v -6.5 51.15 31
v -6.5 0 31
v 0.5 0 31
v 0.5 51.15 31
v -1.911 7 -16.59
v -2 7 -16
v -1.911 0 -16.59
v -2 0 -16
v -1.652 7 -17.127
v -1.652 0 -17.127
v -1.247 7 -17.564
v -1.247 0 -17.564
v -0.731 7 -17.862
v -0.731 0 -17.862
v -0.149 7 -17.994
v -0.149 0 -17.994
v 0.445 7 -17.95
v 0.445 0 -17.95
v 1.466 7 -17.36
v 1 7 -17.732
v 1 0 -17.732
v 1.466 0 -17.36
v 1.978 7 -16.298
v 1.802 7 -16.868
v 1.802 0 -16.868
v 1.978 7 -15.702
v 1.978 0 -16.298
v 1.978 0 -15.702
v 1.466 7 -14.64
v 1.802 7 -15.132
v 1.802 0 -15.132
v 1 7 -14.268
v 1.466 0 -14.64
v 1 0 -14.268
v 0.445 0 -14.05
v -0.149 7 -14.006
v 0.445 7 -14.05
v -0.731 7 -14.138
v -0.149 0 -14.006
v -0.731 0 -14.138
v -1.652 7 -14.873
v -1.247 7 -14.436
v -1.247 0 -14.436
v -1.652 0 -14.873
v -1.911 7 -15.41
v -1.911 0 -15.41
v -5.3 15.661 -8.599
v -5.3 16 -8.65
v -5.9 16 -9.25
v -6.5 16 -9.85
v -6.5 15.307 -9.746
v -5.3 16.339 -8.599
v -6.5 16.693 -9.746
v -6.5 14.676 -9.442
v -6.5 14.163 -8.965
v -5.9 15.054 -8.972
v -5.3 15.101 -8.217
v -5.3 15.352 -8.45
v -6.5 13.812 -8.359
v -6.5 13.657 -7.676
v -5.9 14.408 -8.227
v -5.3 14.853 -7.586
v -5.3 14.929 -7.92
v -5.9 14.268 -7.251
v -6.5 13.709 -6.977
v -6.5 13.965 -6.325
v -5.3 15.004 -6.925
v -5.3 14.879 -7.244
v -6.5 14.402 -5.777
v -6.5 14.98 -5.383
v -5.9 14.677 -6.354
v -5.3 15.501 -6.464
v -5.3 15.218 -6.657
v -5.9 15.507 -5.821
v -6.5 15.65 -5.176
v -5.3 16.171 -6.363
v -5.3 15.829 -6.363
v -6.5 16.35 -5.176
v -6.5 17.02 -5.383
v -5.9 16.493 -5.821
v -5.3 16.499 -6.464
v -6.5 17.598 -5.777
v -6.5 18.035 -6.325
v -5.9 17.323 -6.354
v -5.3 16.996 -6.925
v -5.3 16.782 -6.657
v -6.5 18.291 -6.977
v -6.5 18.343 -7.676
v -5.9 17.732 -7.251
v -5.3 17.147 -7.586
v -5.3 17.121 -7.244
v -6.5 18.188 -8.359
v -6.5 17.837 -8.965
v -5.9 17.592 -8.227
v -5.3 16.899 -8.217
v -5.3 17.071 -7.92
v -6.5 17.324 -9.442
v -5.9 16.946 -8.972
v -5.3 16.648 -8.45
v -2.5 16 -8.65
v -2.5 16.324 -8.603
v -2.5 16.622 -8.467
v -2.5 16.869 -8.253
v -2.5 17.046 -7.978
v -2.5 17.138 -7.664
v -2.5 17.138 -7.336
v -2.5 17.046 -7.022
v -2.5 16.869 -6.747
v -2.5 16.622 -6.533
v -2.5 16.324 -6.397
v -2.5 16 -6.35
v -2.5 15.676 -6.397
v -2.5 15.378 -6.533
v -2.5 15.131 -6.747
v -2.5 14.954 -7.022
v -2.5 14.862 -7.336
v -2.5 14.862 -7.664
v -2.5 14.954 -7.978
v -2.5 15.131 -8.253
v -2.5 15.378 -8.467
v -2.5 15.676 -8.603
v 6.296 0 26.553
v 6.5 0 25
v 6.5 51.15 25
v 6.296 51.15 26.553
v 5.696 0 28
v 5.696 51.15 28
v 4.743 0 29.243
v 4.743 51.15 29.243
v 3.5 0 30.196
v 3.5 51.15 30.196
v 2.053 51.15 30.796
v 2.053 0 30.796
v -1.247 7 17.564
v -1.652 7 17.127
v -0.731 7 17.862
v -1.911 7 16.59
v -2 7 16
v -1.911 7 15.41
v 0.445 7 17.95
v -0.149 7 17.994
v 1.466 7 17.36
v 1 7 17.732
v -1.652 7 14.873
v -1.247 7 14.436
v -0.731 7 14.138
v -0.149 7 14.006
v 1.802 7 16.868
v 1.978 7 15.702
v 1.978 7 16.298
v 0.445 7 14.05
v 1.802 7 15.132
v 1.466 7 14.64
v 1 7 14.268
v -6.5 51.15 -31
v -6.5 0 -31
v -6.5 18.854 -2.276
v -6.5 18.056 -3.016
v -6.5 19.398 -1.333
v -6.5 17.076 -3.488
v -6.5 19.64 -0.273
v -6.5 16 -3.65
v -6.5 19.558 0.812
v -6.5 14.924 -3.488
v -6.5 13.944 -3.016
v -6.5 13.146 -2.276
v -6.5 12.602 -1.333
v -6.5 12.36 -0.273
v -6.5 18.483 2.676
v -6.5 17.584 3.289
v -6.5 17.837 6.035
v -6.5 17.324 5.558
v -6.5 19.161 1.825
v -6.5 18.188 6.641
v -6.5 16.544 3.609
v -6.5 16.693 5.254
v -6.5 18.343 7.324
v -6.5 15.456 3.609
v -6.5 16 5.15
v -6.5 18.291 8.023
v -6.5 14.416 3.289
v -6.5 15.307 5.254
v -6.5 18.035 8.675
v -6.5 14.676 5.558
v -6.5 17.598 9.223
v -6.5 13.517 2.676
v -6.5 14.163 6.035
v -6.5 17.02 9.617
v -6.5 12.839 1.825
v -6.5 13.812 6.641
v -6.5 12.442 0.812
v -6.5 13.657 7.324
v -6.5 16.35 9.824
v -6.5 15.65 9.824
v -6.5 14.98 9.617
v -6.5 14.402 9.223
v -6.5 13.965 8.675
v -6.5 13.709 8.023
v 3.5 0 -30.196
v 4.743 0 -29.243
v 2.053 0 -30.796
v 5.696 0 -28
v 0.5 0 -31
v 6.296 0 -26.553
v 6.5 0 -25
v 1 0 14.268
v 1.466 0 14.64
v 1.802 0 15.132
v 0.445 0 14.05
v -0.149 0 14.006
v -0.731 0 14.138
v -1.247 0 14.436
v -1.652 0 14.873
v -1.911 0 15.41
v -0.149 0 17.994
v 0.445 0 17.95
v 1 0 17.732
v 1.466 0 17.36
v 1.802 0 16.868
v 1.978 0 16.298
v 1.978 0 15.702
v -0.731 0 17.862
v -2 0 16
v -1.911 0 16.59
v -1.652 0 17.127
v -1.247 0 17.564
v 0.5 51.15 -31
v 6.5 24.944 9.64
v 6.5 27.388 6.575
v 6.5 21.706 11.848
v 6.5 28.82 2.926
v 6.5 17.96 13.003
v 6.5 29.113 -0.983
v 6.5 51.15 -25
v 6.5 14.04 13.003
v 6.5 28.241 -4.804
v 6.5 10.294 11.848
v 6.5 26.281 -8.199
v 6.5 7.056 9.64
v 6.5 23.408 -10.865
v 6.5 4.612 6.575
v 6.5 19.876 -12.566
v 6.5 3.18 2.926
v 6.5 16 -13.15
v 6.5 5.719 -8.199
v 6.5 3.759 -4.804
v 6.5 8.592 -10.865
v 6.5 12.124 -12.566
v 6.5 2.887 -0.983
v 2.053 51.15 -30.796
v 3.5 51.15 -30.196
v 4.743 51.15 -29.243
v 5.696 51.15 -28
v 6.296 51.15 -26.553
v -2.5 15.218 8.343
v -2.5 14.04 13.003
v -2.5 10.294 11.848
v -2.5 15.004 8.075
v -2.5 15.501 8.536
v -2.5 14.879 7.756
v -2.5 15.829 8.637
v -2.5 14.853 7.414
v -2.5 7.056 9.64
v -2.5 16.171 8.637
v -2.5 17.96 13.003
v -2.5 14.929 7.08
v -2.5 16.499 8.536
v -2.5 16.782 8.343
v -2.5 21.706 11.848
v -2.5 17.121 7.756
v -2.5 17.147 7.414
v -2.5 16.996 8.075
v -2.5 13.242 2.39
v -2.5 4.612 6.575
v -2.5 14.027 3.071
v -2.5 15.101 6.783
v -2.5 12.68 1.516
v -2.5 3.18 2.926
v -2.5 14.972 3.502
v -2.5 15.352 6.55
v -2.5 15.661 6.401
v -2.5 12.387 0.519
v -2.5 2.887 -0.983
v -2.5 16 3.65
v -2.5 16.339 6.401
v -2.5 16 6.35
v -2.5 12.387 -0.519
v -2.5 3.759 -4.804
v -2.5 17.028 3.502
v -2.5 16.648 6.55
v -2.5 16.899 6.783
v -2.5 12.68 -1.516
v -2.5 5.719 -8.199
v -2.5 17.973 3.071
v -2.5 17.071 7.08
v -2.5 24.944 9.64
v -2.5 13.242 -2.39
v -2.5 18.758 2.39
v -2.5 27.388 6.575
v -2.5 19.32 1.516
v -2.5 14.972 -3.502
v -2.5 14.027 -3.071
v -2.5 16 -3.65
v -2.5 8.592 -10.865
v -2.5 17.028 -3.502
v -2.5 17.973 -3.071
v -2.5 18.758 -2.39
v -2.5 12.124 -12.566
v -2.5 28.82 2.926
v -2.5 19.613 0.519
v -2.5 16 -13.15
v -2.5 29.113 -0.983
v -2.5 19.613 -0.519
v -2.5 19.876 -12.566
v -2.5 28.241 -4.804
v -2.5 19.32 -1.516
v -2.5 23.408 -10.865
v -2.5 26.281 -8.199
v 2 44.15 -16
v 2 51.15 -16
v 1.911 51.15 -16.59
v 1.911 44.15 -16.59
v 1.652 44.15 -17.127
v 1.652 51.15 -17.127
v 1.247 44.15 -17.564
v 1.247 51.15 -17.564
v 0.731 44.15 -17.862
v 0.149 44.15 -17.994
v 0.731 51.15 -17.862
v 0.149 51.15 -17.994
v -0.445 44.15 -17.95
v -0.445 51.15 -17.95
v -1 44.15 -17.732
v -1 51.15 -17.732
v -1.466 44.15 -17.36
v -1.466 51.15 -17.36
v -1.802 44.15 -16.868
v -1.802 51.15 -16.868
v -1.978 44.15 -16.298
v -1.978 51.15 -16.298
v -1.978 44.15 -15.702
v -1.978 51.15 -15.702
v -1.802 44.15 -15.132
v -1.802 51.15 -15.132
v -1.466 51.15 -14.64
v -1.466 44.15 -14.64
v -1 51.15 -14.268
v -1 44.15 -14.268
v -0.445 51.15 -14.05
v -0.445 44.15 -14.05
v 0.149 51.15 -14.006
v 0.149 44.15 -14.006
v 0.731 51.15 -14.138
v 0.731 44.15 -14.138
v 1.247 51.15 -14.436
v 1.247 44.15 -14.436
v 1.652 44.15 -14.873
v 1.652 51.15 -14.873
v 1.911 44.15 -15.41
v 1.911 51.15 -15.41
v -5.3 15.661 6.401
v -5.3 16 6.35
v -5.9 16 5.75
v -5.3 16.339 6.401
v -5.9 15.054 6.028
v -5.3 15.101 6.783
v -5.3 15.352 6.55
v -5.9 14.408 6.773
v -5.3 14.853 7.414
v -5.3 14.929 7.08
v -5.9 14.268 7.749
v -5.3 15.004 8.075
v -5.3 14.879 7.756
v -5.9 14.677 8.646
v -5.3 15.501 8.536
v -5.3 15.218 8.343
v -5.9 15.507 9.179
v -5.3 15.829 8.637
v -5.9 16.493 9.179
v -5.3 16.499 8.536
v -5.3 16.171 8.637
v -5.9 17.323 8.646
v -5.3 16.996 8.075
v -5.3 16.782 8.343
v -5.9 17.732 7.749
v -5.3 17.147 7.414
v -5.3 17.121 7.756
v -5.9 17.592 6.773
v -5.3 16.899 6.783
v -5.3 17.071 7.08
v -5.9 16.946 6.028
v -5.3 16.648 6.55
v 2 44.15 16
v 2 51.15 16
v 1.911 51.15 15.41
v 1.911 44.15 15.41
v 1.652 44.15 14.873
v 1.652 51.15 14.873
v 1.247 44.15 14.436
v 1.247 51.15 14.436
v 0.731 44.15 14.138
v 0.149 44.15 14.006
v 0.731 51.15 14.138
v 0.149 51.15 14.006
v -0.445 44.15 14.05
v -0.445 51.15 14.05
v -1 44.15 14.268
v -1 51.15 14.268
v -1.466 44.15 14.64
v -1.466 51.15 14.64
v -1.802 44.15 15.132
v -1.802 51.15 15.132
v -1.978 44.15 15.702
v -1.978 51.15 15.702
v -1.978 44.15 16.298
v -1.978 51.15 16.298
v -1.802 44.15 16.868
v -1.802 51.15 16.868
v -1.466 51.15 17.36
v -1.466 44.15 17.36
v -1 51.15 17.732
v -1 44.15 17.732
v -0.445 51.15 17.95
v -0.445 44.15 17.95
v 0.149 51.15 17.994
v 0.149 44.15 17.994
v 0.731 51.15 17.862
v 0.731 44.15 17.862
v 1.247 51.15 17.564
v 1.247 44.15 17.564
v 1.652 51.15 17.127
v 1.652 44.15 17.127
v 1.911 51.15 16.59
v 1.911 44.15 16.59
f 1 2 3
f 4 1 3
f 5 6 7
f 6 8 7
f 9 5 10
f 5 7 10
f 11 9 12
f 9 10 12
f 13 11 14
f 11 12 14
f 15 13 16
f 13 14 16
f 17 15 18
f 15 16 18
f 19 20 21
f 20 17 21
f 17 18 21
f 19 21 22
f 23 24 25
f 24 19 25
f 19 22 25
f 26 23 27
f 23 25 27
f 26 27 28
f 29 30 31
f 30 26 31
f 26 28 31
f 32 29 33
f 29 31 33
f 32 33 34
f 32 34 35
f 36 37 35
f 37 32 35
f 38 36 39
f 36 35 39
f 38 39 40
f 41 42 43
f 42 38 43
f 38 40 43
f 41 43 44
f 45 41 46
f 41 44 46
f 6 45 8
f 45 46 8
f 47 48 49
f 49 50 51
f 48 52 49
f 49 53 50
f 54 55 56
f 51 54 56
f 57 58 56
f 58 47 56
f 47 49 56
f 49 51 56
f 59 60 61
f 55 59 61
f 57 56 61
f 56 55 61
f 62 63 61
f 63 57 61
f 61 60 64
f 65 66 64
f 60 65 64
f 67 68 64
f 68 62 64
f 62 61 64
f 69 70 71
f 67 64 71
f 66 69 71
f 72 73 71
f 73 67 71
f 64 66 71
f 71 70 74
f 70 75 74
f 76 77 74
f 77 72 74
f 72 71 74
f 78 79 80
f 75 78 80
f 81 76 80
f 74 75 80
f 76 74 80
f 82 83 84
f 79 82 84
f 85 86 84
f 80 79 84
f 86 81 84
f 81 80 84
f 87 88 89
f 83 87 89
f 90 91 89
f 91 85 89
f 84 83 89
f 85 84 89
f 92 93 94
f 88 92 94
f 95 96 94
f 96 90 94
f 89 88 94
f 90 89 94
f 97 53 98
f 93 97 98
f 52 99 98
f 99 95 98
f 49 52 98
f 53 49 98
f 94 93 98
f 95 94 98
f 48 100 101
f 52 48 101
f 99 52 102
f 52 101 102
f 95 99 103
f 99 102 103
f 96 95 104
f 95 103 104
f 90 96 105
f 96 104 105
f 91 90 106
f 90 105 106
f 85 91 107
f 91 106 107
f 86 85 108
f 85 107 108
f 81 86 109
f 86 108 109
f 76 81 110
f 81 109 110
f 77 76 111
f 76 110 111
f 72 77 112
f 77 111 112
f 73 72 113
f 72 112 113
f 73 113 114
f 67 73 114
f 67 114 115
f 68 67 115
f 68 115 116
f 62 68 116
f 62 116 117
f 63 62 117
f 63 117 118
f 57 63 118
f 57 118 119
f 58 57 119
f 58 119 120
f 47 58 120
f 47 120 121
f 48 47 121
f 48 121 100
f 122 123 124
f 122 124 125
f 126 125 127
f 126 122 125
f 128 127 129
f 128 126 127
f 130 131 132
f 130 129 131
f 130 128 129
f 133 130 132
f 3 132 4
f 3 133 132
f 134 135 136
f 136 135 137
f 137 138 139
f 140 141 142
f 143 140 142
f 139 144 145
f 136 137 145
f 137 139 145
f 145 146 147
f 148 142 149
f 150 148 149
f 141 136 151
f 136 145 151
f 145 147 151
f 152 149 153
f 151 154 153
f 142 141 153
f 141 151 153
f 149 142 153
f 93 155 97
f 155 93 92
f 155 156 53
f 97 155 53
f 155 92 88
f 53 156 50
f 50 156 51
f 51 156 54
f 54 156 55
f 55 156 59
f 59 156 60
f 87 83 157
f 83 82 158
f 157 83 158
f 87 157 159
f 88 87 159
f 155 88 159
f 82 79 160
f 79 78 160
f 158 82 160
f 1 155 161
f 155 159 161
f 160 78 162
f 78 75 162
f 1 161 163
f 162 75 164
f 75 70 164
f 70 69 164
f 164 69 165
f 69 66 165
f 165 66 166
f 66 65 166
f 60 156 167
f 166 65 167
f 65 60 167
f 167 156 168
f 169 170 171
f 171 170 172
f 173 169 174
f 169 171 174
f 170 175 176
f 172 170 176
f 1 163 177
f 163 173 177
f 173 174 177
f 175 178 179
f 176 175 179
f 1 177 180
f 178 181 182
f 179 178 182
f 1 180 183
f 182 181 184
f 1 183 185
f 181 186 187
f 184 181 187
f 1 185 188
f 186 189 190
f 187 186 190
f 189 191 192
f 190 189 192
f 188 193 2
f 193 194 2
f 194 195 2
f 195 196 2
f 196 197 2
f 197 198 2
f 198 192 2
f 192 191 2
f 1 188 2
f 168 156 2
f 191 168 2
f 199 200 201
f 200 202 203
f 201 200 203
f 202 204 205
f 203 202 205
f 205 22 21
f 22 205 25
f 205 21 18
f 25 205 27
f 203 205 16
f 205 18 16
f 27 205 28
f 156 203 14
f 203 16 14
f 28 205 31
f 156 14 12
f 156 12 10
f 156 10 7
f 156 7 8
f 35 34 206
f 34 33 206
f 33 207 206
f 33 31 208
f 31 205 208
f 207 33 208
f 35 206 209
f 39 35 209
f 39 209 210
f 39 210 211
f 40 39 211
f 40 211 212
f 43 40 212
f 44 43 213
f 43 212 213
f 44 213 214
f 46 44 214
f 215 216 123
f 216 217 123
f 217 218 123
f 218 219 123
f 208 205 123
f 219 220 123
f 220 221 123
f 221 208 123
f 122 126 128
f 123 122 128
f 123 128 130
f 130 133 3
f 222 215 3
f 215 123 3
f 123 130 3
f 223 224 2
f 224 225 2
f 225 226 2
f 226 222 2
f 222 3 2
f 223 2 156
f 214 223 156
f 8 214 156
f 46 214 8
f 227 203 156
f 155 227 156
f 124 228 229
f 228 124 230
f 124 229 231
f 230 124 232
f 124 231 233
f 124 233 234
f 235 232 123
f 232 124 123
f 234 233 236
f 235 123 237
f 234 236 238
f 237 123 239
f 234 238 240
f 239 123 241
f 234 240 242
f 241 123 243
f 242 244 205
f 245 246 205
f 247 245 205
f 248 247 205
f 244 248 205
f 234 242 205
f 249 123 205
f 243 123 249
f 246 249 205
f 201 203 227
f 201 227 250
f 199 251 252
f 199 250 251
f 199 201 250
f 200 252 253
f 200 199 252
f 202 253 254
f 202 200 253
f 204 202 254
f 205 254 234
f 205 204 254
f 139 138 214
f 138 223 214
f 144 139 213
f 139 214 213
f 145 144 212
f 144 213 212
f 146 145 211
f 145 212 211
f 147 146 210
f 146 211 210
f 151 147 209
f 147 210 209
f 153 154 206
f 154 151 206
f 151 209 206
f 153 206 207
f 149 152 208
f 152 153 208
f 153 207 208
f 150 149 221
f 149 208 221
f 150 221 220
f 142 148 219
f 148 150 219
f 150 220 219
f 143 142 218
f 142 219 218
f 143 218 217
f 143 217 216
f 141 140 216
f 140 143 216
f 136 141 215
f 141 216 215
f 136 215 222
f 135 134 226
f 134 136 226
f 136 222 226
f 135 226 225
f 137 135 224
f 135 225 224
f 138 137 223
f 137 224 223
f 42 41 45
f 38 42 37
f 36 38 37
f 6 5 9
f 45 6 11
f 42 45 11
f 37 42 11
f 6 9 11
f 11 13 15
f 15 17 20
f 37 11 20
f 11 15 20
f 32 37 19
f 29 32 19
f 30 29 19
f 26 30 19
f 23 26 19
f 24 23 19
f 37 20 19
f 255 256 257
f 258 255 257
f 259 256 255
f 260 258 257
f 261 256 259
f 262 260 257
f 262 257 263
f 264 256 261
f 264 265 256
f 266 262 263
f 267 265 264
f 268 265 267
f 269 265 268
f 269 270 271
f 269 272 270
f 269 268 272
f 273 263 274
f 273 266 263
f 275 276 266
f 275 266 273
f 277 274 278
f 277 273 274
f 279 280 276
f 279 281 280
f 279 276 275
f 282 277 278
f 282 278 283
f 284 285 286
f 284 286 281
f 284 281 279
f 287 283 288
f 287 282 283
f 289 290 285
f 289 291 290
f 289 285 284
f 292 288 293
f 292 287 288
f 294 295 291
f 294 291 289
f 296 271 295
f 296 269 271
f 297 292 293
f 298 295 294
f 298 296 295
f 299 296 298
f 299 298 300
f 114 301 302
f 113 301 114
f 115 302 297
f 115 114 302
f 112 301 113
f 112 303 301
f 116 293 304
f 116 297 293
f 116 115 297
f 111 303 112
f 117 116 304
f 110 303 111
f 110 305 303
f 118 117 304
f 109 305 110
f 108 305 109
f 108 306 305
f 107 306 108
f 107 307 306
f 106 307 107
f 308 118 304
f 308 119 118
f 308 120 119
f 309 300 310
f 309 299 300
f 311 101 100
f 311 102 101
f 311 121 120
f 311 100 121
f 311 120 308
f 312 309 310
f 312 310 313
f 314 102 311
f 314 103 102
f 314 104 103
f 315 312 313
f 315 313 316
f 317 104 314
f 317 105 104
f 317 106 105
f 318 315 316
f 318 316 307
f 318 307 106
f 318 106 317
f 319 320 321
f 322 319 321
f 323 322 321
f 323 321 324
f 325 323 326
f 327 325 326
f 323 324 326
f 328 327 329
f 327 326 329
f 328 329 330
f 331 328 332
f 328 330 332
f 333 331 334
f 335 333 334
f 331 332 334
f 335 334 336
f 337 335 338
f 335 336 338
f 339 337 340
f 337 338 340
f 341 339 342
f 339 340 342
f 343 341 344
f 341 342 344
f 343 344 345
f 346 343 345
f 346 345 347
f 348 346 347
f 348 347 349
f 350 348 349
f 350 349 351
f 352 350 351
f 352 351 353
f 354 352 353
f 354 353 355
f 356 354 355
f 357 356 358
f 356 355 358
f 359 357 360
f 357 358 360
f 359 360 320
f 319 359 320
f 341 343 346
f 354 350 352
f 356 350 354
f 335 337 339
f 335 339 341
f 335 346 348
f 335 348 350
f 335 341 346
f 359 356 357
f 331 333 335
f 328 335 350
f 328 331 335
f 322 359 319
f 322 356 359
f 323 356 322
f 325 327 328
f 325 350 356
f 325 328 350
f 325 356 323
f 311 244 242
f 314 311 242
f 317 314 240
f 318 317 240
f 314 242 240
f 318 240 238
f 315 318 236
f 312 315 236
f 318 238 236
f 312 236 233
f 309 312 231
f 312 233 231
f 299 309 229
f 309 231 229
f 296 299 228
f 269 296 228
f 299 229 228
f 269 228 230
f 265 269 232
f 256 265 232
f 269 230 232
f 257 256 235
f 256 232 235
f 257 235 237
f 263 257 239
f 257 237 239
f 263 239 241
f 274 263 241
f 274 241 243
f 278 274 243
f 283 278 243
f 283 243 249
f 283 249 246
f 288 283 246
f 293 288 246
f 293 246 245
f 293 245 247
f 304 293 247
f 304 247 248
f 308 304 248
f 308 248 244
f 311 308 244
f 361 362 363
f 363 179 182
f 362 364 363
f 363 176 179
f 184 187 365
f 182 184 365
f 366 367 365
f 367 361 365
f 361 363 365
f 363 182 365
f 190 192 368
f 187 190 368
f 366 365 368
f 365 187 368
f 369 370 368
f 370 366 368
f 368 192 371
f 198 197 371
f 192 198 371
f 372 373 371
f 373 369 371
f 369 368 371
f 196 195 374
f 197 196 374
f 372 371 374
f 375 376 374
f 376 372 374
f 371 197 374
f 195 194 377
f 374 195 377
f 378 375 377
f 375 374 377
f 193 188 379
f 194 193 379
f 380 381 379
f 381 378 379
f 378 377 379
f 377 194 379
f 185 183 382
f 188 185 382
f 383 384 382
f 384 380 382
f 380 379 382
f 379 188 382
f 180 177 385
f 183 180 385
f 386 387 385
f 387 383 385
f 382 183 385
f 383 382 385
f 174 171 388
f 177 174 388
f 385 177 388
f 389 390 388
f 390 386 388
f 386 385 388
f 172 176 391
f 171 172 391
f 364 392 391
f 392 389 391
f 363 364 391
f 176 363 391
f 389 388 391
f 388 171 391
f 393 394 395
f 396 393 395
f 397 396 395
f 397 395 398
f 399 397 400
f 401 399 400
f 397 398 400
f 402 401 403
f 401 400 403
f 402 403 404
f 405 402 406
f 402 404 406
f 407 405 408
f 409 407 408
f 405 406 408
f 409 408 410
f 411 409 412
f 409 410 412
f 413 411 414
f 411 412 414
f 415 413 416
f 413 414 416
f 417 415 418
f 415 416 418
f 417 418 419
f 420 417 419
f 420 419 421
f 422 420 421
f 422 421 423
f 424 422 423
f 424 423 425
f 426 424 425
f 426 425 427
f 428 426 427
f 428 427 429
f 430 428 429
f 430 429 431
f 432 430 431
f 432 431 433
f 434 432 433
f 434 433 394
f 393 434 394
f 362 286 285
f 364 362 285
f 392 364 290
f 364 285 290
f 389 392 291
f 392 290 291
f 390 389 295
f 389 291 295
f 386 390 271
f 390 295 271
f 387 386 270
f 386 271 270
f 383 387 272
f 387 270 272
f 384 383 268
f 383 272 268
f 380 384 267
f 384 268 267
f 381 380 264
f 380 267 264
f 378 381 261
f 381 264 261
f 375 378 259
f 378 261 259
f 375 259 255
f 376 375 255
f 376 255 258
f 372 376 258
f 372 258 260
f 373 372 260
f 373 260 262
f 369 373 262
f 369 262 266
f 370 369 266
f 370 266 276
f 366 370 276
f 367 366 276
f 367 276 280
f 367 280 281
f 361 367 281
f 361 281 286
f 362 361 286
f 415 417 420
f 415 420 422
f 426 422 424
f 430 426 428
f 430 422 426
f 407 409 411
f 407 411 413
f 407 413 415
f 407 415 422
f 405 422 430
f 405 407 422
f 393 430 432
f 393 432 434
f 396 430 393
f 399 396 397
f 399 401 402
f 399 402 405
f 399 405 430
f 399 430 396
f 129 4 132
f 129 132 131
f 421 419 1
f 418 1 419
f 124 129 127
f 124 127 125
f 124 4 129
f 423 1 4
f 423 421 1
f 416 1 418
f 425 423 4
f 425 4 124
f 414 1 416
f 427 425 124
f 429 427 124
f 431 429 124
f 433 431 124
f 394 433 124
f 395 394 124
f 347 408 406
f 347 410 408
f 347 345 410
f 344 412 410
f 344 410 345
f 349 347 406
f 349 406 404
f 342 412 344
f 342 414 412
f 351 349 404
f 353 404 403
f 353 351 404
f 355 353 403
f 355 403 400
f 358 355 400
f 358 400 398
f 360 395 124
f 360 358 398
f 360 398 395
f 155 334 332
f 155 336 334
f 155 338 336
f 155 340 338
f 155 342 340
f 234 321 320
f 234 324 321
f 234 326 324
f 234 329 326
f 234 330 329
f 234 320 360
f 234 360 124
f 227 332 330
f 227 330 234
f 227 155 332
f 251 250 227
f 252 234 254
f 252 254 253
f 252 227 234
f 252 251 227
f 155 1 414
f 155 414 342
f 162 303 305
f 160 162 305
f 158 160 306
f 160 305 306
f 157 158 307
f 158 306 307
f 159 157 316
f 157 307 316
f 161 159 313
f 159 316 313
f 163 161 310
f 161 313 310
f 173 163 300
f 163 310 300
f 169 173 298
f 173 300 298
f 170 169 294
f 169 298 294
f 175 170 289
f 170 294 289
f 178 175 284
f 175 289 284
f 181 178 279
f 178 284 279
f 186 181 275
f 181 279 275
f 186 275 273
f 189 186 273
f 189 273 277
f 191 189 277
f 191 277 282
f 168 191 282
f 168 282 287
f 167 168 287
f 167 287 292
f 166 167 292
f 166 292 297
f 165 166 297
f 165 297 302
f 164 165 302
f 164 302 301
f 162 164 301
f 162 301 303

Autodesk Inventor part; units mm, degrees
ref_plane "YZ Plane" through (0, 0, 0) normal (1, 0, 0) x (0, 1, 0)
ref_plane "XZ Plane" through (0, 0, 0) normal (0, 1, 0) x (-1, 0, 0)
ref_plane "XY Plane" through (0, 0, 0) normal (0, 0, 1) x (1, 0, 0)
sketch "Эскиз1" plane through (0, 0, 0) normal (0, 1, 0) x (-1, 0, 0)
  line L0 (6.5, 31) -> (-6.5, 31)
  line L1 (-6.5, 31) -> (-6.5, -31)
  line L2 (-6.5, -31) -> (6.5, -31)
  line L3 (6.5, -31) -> (6.5, 31)
  line L4 (-6.5, 31) -> (6.5, -31) construction
  line L5 (0, 31) -> (0, -31) construction
  circle A0 centre (0, 16) radius 2
  line L6 (6.5, 0) -> (-6.5, 0) construction
  circle A1 centre (0, -16) radius 2
  point P0 (0, 0)
  point P1 (0, 0)
  dimension "d0" = 13
  dimension "d1" = 62
  dimension "d2" = 16
  dimension "d3" = 4
extrude "Выдавливание1" add sketch "Эскиз1" along normal blind 32
sketch "Эскиз2" plane through (6.5, 0, 31) normal (1, 0, 0) x (0, 0, -1)
  line L0 (0, 32) -> (62, 32) projected
  line L1 (62, 0) -> (0, 0) projected
  line L2 (62, 32) -> (0, 0) construction
  circle A0 centre (31, 16) radius 10.15
  line L3 (20.85, 16) -> (41.15, 16) construction
  circle A1 centre (23.5, 16) radius 1.15
  circle A2 centre (38.5, 16) radius 1.15
  line L4 (23.5, 16) -> (38.5, 16)
  circle A3 centre (31, 16) radius 13.15
  line L5 (31, 29.15) -> (31, 2.85)
  line L6 (62, 0) -> (62, 32) projected
  circle A4 centre (31, 16) radius 3.65
  point P0 (31, 0)
  dimension "d9" = 20.3
  dimension "d10" = 2.3
  dimension "d11" = 15
  dimension "d17" = 7.3
  dimension "d21" = 26.3
extrude "Выдавливание3" cut sketch "Эскиз2" against normal through all contours A2 | A1 | A4 L4 L5 | L5 L4 A4 | A4 L4 L5 | L5 L4 A4
extrude "Выдавливание4" cut sketch "Эскиз2" against normal blind 9
sketch "Эскиз3" plane through (0, 32, 0) normal (0, 1, 0) x (1, 0, 0)
  circle A0 centre (0, -16) radius 2 projected
  circle A1 centre (0, 16) radius 2 projected
  point P0 (0, 0)
extrude "Выдавливание5" add sketch "Эскиз3" against normal blind 25
fillet "Сопряжение1" radius 6 2 edges at (6.5, 16, 31) (6.5, 16, -31)
chamfer "Фаска1" distance 1.2 angle 45 2 edges at (-6.5, 16, -6.35) (-6.5, 16, 8.65)
sketch "Эскиз6" plane through (0, 32, 0) normal (0, 1, 0) x (1, 0, 0)
  arc A0 (6.5, 25) -> (0.5, 31) centre (0.5, 25) ccw projected
  line L0 (0.5, 31) -> (-6.5, 31) projected
  line L1 (-6.5, 31) -> (-6.5, -31) projected
  line L2 (-6.5, -31) -> (0.5, -31) projected
  arc A1 (0.5, -31) -> (6.5, -25) centre (0.5, -25) ccw projected
  line L3 (6.5, -25) -> (6.5, 25) projected
  point P0 (0, 0)
extrude "Выдавливание6" add sketch "Эскиз6" along normal blind 19.15
sketch "Эскиз7" plane through (0, 51.15, 0) normal (0, 1, 0) x (1, 0, 0)
  circle A0 centre (0, -16) radius 2 projected
  circle A1 centre (0, 16) radius 2 projected
  point P0 (0, 0)
extrude "Выдавливание7" cut sketch "Эскиз7" against normal blind 7
properties part number "motor_mount_edge" material "Полиэтилен, низкая плотность"
